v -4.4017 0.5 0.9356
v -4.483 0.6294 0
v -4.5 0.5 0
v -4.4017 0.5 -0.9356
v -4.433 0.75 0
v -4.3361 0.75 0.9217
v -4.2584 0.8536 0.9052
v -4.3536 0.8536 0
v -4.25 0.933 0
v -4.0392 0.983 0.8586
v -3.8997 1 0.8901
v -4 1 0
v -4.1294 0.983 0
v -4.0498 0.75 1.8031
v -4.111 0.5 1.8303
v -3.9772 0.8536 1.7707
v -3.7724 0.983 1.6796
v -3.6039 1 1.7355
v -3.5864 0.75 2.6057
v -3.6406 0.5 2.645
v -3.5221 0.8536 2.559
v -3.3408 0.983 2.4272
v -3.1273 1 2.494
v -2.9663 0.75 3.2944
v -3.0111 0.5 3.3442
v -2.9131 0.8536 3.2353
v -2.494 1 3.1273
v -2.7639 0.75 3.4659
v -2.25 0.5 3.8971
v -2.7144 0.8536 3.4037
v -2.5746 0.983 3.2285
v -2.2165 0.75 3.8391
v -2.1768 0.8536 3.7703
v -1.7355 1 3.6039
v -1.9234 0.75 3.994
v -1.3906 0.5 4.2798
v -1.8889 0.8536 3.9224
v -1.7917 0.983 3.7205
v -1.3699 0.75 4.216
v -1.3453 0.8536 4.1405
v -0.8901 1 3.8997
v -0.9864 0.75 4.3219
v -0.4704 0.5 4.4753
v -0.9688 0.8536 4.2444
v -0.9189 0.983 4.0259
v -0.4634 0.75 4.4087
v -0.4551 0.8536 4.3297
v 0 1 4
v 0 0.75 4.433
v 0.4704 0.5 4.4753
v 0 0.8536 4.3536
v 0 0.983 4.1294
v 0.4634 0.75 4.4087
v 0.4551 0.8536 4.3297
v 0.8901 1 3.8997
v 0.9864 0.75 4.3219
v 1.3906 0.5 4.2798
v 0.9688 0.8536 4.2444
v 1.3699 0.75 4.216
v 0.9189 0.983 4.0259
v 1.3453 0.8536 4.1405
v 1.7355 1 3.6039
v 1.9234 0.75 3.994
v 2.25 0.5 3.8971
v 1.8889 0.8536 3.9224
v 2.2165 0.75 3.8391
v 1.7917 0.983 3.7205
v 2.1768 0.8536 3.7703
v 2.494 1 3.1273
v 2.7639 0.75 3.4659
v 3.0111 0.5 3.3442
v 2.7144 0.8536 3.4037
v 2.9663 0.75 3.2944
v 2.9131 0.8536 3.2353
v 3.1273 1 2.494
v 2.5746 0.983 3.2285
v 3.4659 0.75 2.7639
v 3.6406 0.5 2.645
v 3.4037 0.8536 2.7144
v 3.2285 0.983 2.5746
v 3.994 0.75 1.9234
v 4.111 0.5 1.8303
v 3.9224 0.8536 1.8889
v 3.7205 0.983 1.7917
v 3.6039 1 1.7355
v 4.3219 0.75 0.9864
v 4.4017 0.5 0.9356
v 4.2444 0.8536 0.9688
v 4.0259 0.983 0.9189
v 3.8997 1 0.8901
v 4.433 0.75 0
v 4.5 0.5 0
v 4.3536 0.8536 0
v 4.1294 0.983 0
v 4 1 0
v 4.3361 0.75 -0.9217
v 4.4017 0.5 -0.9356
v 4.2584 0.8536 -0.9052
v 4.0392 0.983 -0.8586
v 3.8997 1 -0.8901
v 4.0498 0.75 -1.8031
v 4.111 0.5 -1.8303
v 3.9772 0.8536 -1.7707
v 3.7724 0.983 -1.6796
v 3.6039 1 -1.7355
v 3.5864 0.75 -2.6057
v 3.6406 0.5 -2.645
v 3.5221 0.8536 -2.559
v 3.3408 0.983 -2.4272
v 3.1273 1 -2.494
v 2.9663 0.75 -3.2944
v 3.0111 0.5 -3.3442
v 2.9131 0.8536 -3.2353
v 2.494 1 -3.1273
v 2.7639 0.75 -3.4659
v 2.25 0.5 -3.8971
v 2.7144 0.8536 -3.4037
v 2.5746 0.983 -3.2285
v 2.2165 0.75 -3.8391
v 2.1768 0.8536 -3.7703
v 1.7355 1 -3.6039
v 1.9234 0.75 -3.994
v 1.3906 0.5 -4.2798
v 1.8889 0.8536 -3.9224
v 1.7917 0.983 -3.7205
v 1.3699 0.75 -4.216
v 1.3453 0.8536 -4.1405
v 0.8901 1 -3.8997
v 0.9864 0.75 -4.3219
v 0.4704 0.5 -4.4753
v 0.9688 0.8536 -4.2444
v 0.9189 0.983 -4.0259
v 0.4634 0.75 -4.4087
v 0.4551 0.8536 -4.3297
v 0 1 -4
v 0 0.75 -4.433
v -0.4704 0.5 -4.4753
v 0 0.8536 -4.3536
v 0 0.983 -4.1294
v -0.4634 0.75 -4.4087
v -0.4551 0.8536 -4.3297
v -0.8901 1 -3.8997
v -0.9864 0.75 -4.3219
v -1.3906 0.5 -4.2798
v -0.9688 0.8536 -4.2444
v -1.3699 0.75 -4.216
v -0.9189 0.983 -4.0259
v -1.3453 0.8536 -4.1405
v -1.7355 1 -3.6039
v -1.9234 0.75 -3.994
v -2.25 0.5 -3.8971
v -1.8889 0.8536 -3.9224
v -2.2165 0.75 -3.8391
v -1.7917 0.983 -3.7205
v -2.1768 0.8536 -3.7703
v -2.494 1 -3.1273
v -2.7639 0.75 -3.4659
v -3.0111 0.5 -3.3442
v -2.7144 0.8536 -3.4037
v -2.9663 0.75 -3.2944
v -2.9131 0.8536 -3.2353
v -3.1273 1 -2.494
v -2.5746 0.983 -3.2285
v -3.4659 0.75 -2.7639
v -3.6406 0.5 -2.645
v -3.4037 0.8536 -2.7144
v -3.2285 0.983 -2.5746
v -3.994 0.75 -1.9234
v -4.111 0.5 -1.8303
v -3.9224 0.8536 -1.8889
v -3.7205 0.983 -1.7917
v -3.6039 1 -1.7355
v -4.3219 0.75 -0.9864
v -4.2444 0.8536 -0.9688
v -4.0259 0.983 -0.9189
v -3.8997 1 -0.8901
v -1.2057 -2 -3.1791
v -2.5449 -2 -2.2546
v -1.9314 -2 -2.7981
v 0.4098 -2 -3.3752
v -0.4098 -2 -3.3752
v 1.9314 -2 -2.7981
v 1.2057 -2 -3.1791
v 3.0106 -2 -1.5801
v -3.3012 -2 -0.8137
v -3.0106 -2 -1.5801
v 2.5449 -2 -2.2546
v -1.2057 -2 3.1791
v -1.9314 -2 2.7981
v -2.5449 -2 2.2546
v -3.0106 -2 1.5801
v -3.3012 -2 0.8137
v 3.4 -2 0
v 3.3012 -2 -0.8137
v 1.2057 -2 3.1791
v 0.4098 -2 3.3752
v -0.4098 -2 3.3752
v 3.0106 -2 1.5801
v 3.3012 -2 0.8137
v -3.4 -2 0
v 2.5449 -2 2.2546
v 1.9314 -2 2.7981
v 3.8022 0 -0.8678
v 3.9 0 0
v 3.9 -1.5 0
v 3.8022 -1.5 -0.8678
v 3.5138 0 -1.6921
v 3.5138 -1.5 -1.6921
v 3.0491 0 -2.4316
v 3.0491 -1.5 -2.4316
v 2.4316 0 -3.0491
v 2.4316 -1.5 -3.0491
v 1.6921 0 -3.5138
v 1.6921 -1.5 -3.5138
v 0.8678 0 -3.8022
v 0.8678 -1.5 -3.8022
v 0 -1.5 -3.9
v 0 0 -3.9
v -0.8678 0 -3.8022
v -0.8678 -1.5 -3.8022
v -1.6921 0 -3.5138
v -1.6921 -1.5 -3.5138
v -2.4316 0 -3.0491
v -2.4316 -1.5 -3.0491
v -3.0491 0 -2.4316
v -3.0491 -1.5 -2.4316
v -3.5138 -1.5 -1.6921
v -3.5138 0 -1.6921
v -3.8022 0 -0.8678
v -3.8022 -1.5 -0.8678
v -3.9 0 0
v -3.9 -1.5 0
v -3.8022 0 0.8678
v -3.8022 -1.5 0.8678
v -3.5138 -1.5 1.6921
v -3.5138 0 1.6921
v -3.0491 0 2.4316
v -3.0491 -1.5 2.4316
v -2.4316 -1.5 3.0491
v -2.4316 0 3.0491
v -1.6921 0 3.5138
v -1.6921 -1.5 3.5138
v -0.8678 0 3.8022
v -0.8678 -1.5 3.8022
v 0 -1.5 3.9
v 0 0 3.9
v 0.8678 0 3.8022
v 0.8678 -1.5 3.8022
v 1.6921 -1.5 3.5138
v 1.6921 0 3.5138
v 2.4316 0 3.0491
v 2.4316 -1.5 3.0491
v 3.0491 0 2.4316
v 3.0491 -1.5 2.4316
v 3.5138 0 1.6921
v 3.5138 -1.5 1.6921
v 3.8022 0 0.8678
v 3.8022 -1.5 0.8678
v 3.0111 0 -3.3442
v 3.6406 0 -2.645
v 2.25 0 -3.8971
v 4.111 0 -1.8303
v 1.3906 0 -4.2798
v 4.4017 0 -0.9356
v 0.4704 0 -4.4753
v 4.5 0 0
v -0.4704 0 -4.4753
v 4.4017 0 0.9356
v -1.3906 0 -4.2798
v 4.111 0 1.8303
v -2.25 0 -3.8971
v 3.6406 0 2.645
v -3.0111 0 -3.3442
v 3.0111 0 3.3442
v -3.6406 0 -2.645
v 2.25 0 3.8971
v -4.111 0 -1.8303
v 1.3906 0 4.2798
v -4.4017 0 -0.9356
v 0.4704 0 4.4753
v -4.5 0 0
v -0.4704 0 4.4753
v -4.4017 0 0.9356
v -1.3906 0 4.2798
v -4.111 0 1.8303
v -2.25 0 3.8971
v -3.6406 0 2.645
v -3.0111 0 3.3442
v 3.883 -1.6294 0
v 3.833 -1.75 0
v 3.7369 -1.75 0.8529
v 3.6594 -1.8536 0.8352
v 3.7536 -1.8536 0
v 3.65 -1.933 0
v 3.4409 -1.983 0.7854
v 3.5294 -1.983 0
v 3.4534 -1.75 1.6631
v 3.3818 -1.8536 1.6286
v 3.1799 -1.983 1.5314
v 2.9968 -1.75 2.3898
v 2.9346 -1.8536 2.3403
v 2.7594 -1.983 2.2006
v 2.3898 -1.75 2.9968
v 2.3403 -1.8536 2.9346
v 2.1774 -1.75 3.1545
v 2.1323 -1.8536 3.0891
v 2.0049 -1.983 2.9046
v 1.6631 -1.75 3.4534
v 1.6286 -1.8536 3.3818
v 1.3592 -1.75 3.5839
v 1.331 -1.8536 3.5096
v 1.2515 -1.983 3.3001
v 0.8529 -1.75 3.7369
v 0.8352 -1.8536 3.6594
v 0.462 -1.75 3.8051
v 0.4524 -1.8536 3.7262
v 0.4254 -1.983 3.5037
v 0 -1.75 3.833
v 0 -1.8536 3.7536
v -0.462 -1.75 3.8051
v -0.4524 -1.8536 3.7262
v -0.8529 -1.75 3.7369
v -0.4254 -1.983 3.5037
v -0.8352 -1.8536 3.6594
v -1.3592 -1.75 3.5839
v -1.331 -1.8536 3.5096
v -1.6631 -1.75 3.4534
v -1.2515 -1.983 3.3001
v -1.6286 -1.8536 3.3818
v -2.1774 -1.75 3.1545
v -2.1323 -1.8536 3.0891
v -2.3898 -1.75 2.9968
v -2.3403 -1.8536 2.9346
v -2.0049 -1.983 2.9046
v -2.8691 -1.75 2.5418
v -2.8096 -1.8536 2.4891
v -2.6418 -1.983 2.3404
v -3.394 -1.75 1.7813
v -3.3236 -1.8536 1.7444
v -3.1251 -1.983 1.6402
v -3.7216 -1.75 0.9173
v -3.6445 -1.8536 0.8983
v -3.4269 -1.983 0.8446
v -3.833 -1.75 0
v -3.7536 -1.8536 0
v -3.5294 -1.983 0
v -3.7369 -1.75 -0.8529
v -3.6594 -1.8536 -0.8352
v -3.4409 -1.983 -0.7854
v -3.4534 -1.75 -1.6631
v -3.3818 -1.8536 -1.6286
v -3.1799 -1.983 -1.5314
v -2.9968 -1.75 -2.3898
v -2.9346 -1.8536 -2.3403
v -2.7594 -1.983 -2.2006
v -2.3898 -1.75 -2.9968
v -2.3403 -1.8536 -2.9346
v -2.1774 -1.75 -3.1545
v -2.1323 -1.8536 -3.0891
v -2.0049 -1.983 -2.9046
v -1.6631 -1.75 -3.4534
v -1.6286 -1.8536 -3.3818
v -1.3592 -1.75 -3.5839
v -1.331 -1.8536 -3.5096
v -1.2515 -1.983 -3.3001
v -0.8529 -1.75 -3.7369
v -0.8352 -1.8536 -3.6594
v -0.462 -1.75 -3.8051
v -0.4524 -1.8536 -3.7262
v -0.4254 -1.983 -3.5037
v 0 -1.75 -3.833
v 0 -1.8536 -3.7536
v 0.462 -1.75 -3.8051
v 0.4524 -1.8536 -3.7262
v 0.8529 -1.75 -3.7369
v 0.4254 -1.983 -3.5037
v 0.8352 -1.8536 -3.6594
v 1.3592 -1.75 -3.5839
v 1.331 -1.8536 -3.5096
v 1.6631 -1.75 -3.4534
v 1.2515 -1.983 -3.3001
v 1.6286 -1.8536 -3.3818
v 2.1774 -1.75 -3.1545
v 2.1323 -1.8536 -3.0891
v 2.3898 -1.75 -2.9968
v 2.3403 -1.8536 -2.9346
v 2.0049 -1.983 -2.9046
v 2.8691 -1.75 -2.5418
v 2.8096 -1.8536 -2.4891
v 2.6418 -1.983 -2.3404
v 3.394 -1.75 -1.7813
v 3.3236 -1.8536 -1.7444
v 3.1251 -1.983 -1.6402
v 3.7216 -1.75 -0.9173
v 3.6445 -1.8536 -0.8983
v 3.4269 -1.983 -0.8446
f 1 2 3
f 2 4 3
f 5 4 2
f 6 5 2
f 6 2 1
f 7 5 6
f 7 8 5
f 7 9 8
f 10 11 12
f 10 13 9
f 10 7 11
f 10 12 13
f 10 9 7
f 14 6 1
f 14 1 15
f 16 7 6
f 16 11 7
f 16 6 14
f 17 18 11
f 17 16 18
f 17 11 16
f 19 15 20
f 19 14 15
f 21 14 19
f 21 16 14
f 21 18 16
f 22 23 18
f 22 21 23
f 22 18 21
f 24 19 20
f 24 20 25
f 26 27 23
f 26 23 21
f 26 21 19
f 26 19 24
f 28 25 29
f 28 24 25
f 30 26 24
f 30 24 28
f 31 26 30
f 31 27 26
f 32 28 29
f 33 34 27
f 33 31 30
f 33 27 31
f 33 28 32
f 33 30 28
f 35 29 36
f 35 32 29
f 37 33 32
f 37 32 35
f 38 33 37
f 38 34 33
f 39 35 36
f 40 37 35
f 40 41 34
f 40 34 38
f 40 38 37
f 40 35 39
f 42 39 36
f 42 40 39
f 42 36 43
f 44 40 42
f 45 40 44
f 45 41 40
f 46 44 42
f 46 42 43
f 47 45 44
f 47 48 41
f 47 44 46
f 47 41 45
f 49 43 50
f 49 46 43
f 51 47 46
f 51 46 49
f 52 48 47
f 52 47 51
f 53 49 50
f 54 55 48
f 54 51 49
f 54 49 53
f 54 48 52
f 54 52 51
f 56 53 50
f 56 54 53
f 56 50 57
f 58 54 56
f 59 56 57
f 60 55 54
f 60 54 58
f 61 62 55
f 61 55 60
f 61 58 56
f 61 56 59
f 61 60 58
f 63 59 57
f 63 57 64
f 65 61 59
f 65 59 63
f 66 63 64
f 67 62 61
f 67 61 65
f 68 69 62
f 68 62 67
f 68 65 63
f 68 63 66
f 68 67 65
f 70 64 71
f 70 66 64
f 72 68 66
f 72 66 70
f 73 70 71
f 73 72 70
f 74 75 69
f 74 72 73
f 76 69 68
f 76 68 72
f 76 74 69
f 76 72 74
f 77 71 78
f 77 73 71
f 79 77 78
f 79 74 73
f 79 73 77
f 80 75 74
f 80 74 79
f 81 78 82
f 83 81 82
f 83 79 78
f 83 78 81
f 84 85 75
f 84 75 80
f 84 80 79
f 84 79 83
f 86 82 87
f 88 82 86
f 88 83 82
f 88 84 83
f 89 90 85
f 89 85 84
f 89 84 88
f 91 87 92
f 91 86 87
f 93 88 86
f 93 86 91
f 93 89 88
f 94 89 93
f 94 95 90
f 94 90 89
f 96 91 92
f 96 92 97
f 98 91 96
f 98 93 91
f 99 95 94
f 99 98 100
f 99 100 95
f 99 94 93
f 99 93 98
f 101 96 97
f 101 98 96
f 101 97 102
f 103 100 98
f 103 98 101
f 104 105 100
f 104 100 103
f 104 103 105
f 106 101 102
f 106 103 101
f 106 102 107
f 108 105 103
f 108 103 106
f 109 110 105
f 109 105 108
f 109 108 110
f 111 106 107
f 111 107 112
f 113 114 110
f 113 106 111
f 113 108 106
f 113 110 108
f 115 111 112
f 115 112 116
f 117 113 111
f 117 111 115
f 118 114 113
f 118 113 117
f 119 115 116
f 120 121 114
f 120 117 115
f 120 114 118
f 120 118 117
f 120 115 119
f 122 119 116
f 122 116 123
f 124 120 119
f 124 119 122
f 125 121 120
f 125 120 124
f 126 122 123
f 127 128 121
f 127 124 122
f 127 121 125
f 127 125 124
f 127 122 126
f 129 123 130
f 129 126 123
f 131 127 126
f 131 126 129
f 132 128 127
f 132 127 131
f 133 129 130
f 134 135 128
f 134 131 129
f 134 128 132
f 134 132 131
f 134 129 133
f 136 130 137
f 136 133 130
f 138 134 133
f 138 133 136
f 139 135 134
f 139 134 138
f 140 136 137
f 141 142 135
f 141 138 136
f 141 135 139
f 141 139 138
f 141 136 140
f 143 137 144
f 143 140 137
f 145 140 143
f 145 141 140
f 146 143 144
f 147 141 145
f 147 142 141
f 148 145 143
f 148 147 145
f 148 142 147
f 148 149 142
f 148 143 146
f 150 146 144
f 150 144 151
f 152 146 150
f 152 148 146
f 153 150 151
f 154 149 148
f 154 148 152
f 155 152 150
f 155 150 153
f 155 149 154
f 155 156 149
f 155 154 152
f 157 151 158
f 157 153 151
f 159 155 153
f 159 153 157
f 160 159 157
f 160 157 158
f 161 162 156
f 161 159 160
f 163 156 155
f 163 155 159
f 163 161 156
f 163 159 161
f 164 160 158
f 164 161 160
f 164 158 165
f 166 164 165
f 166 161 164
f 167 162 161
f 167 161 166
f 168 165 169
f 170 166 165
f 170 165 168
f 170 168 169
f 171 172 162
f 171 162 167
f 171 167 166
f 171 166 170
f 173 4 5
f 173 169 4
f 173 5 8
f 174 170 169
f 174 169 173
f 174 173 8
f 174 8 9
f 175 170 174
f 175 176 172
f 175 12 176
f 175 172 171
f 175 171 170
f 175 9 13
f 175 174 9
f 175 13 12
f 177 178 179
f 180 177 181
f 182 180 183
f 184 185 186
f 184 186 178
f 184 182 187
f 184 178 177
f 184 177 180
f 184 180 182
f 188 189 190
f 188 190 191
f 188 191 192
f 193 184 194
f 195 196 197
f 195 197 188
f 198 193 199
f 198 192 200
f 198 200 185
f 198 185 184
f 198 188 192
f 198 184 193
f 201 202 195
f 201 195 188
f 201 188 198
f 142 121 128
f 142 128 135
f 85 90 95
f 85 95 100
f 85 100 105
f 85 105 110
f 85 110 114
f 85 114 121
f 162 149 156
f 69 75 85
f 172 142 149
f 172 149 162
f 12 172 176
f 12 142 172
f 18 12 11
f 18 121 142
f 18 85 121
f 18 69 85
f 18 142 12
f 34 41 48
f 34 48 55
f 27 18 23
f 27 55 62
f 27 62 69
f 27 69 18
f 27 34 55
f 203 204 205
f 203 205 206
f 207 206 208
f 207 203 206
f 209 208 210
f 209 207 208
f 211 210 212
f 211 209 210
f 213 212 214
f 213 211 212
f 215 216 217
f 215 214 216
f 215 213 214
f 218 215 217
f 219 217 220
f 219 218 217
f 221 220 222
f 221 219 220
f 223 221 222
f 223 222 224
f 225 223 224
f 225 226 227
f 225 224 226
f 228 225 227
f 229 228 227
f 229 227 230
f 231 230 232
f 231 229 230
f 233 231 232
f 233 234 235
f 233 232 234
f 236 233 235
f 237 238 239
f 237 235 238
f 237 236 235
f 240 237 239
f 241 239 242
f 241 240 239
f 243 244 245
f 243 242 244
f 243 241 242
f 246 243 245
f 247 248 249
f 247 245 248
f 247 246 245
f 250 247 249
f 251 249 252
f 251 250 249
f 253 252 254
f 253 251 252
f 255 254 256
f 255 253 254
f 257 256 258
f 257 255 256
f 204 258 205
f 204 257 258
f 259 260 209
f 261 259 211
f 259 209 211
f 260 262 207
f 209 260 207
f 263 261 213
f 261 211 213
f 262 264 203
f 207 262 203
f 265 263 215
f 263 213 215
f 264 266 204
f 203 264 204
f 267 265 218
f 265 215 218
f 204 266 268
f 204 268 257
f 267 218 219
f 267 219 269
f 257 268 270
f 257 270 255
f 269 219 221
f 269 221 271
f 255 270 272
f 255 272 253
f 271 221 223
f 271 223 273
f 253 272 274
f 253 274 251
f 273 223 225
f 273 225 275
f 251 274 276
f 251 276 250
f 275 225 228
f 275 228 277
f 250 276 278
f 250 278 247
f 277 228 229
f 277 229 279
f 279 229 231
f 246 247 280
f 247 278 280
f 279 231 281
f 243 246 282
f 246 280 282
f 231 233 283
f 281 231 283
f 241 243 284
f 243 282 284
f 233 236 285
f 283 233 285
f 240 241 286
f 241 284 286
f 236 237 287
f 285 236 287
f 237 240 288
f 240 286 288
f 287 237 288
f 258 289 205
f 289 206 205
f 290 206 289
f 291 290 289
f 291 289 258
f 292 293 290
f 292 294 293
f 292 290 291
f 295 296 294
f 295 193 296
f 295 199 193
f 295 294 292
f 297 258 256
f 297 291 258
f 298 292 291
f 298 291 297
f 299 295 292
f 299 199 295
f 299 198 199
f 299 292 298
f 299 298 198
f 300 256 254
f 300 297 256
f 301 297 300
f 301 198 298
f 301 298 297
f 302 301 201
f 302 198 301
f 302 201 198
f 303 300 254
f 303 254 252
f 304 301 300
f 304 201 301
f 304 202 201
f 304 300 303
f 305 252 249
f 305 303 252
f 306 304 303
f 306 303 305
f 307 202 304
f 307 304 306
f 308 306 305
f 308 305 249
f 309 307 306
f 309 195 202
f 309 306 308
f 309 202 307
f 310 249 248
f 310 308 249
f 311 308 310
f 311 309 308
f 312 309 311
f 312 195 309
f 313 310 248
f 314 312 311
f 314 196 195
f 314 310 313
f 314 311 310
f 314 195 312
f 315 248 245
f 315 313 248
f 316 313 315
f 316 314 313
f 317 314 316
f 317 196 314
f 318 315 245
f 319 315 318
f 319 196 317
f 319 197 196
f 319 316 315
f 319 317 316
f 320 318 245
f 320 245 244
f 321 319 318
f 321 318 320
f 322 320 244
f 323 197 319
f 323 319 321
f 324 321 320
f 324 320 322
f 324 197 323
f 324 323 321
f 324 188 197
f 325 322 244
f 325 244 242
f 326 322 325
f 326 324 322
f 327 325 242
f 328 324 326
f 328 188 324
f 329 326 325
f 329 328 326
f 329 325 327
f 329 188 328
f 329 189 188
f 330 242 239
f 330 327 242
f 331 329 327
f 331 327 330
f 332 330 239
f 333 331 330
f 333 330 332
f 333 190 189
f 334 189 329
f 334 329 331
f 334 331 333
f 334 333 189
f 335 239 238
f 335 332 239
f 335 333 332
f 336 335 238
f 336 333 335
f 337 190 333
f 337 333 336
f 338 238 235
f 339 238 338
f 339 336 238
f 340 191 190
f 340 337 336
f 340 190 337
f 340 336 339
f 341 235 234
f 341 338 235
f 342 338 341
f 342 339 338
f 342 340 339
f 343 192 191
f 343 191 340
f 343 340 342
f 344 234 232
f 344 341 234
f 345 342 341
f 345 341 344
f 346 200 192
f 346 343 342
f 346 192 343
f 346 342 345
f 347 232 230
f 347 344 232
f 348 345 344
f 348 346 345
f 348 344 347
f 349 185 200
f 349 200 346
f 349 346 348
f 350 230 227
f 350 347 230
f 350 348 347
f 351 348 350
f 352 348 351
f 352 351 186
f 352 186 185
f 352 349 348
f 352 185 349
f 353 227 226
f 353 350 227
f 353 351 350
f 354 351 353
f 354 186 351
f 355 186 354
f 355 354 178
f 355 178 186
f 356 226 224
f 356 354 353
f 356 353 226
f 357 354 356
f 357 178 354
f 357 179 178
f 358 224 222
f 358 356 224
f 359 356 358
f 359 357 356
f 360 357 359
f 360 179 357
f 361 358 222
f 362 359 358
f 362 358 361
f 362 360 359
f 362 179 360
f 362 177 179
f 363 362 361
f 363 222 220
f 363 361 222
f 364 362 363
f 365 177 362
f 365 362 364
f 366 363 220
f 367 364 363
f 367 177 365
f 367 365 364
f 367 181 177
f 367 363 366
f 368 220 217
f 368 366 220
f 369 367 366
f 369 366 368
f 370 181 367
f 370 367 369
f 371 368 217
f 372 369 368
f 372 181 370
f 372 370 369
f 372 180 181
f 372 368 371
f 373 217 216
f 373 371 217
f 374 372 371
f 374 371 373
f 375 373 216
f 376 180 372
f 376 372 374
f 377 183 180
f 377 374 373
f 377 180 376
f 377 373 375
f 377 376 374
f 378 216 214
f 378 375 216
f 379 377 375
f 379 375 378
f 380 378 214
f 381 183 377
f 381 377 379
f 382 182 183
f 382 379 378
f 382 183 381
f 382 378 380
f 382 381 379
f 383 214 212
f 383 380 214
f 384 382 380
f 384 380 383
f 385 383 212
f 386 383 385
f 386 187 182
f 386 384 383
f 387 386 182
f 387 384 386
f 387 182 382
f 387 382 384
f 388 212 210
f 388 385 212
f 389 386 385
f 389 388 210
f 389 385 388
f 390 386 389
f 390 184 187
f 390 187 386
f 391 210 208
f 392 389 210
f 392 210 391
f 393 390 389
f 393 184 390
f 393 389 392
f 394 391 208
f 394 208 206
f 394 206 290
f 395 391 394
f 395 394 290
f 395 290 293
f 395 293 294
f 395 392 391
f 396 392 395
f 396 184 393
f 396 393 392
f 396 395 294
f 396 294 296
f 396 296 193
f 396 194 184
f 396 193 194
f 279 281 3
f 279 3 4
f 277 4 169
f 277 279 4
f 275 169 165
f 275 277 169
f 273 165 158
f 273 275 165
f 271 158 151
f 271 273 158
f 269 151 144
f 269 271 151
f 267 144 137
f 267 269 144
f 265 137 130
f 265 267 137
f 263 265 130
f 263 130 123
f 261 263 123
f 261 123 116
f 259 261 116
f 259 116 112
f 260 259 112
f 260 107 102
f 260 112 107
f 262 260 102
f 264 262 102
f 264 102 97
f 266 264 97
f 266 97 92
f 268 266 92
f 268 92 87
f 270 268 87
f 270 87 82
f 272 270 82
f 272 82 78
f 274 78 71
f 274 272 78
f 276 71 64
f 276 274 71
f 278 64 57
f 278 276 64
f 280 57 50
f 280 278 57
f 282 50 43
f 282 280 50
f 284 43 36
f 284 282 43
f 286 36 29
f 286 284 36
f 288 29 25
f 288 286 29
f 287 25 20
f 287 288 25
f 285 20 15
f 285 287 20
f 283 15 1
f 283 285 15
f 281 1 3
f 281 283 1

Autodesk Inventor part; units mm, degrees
ref_plane "YZ Plane" through (0, 0, 0) normal (1, 0, 0) x (0, 1, 0)
ref_plane "XZ Plane" through (0, 0, 0) normal (0, 1, 0) x (-1, 0, 0)
ref_plane "XY Plane" through (0, 0, 0) normal (0, 0, 1) x (1, 0, 0)
sketch "Boceto1" plane through (0, 0, 0) normal (0, 1, 0) x (-1, 0, 0)
  circle A0 centre (0, 0) radius 4.5
  dimension "d0" = 9
extrude "Extrusión1" add sketch "Boceto1" along normal blind 1
fillet "Empalme1" radius 0.5 1 edges at (4.5, 1, 0)
sketch "Boceto2" plane through (0, 0, 0) normal (0, -1, 0) x (1, 0, 0)
  circle A0 centre (0, 0) radius 3.9
  dimension "d4" = 7.8
extrude "Extrusión2" add sketch "Boceto2" along normal blind 2
fillet "Empalme2" radius 0.5 1 edges at (-3.9, -2, 0)
properties part number "sensor_2"
